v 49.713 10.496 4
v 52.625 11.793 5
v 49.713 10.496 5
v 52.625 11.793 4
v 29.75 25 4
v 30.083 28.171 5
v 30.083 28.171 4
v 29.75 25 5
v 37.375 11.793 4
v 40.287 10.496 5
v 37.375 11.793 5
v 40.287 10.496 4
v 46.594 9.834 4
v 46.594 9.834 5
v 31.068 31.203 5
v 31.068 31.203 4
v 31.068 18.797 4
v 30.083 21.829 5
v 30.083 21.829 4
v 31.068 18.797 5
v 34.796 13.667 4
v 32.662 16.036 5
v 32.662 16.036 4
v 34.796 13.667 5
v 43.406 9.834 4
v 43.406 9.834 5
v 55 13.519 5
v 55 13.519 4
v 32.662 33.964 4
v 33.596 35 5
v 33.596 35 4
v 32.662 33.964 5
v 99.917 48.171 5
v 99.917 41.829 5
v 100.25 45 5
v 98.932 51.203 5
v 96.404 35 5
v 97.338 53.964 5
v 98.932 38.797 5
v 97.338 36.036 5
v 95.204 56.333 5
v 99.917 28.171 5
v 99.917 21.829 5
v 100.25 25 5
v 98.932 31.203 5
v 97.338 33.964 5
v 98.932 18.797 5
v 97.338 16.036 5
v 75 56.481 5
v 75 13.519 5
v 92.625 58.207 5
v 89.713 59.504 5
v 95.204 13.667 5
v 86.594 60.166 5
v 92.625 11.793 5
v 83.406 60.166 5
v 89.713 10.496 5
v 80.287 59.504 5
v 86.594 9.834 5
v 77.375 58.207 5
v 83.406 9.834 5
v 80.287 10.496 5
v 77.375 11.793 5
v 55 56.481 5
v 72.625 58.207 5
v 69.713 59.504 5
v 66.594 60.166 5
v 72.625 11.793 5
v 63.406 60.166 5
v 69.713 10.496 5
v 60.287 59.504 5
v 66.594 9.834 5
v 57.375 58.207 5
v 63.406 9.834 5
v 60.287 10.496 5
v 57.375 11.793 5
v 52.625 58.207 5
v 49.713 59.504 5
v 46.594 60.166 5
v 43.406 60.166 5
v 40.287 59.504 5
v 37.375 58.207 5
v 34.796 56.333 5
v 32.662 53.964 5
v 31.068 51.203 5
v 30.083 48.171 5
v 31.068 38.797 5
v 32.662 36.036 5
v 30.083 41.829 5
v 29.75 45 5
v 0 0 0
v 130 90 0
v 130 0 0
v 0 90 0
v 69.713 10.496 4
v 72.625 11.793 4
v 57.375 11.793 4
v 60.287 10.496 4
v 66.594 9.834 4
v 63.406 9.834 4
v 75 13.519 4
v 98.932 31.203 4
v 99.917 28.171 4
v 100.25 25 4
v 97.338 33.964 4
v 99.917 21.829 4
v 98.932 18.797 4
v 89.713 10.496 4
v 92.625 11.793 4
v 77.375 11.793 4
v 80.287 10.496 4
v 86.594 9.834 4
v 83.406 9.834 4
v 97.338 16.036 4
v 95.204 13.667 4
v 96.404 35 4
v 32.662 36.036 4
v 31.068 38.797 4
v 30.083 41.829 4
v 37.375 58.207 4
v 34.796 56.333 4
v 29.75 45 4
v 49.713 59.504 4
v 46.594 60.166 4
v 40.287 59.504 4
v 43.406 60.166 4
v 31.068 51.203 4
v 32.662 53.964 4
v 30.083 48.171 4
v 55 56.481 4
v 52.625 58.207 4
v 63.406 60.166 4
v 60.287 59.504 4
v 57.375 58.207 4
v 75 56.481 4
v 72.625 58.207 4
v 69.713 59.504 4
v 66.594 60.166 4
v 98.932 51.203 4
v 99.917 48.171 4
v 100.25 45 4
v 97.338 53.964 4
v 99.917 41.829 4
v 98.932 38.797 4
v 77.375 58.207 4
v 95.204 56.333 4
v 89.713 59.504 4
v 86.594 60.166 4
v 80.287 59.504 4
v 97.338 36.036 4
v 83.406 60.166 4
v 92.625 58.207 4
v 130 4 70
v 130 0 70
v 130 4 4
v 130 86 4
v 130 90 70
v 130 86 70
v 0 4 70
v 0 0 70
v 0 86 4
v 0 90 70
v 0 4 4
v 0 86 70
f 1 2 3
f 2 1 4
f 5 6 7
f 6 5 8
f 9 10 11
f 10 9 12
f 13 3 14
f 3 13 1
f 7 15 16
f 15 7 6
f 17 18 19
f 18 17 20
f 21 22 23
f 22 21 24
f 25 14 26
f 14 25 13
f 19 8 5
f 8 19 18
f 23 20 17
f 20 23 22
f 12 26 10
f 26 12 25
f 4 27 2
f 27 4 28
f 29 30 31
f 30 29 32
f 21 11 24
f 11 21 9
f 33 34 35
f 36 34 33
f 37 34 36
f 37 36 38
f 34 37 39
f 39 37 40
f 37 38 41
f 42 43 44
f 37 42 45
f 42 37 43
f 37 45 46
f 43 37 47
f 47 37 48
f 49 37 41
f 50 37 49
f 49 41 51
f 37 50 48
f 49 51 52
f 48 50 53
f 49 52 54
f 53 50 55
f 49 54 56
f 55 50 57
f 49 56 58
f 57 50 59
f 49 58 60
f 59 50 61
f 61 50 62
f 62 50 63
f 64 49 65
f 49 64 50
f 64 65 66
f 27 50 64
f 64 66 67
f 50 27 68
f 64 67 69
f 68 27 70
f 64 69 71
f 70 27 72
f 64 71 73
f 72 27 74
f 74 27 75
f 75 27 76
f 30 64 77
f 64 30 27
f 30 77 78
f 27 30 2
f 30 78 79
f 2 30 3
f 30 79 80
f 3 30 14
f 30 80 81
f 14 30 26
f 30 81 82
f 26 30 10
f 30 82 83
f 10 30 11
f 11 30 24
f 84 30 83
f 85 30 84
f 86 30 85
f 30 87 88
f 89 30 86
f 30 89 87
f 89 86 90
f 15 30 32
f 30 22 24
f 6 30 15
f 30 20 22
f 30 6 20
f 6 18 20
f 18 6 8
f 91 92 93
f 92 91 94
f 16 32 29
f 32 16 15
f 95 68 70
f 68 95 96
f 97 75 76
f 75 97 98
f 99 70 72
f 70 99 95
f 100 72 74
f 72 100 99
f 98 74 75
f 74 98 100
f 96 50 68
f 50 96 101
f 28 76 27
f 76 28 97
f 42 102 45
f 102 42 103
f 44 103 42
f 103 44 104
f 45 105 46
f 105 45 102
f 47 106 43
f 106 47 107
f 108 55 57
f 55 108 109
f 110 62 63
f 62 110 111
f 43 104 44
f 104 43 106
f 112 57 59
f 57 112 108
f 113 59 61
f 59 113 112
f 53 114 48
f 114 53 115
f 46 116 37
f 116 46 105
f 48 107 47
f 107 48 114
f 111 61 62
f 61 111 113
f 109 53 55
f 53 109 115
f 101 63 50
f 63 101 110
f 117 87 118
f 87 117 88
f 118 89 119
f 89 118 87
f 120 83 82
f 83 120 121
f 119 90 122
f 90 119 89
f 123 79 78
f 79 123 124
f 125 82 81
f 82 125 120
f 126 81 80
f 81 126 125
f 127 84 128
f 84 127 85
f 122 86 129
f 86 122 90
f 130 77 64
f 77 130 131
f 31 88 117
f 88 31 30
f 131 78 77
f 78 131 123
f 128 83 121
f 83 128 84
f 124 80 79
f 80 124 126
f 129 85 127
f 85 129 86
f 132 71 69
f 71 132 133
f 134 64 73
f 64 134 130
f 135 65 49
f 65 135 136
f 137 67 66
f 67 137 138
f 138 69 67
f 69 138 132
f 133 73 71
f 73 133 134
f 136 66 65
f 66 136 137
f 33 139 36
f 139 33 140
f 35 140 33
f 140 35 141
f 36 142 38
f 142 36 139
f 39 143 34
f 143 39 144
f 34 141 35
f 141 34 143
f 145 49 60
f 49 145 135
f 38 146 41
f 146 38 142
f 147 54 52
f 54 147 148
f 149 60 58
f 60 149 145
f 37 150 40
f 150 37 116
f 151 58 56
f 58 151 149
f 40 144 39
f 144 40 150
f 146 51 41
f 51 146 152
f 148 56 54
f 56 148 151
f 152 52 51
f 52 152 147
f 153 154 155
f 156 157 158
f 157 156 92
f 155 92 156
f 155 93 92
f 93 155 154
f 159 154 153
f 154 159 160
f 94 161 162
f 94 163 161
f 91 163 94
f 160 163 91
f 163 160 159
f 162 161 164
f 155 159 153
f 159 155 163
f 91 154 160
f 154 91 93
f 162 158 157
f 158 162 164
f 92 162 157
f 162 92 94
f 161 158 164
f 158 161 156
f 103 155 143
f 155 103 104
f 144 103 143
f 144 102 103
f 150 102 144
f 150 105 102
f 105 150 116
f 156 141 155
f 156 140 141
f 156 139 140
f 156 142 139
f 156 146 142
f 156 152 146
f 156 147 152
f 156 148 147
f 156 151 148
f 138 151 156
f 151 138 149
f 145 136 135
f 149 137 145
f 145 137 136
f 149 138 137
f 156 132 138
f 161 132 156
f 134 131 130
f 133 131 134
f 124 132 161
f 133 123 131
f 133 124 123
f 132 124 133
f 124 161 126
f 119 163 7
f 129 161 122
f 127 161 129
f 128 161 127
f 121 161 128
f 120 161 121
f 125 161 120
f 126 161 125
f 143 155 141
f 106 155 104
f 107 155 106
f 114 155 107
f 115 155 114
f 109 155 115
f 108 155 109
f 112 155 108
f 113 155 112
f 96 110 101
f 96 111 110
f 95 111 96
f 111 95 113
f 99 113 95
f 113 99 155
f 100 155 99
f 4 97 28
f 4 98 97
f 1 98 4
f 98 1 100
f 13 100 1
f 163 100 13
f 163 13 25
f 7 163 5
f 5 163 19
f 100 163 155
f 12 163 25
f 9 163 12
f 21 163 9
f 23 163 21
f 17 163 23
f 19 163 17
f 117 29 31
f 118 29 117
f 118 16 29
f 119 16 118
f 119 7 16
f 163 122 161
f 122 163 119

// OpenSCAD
// Dimensions for the Falcon tube rack design

// Plate dimensions
plate_x = 130; // Length of the plate (X-axis) in mm
plate_y = 90;  // Width of the plate (Y-axis) in mm
plate_thickness = 4; // Thickness of the base plate (Z-dimension at z=0)

// Hole dimensions
hole_diameter = 30.5; // Diameter of the through-holes in mm
hole_spacing = 40;    // Center-to-center spacing for holes in both X and Y directions in mm

// Wall dimensions
wall_length = plate_x; // Length of the side walls (X-dimension) in mm
wall_thickness = 4;   // Thickness of the side walls (Y-dimension)
wall_height = 70;     // Height of the side walls from z=0 to z=70

// Clearance for cutting operations
clearance = 1.0; // Small offset for cuts

// --- Base Plate ---
module base_plate() {
    cube([plate_x, plate_y, plate_thickness]);
}

// --- Through Holes (Cutout from the plate) ---
module through_holes() {
    // X positions: Centers at 25, 65, 85 (based on 40mm spacing for 130mm length)
    x_positions = [
        plate_x / 2 - hole_spacing / 2, // 25
        plate_x / 2,                     // 65
        plate_x / 2 + hole_spacing / 2  // 85
    ];

    // Y positions: Centers at 20, 45 (based on 40mm spacing for 90mm width)
    y_positions = [
        plate_y / 2 - hole_spacing / 2, // 20
        plate_y / 2                      // 45
    ];

    for (i = [0 : 1]) { // Iterate through the two rows along Y
        for (j = [0 : 2]) { // Iterate through the three columns along X
            hole_center_x = x_positions[j];
            hole_center_y = y_positions[i];

            // Cut cylinder extending slightly beyond plate thickness to ensure clean cut
            translate([hole_center_x, hole_center_y, 0]) {
                cylinder(r = hole_diameter / 2, h = plate_thickness + clearance);
            }
        }
    }
}

// --- Side Walls (Prisms rising from the base) ---
module side_walls() {
    // Wall 1: Along the edge Y=0
    translate([0, 0, 0]) {
        cube([wall_length, wall_thickness, wall_height]);
    }

    // Wall 2: Along the edge Y=plate_y (90mm)
    translate([0, plate_y - wall_thickness, 0]) {
        cube([wall_length, wall_thickness, wall_height]);
    }
}

// --- Main Assembly ---
module falcon_rack() {
    // Start with the base plate
    base_plate();

    // Cut holes in the plate (This operation modifies the base_plate geometry)
    through_holes();

    // Add the side walls on top of the structure
    side_walls();
}

falcon_rack();
